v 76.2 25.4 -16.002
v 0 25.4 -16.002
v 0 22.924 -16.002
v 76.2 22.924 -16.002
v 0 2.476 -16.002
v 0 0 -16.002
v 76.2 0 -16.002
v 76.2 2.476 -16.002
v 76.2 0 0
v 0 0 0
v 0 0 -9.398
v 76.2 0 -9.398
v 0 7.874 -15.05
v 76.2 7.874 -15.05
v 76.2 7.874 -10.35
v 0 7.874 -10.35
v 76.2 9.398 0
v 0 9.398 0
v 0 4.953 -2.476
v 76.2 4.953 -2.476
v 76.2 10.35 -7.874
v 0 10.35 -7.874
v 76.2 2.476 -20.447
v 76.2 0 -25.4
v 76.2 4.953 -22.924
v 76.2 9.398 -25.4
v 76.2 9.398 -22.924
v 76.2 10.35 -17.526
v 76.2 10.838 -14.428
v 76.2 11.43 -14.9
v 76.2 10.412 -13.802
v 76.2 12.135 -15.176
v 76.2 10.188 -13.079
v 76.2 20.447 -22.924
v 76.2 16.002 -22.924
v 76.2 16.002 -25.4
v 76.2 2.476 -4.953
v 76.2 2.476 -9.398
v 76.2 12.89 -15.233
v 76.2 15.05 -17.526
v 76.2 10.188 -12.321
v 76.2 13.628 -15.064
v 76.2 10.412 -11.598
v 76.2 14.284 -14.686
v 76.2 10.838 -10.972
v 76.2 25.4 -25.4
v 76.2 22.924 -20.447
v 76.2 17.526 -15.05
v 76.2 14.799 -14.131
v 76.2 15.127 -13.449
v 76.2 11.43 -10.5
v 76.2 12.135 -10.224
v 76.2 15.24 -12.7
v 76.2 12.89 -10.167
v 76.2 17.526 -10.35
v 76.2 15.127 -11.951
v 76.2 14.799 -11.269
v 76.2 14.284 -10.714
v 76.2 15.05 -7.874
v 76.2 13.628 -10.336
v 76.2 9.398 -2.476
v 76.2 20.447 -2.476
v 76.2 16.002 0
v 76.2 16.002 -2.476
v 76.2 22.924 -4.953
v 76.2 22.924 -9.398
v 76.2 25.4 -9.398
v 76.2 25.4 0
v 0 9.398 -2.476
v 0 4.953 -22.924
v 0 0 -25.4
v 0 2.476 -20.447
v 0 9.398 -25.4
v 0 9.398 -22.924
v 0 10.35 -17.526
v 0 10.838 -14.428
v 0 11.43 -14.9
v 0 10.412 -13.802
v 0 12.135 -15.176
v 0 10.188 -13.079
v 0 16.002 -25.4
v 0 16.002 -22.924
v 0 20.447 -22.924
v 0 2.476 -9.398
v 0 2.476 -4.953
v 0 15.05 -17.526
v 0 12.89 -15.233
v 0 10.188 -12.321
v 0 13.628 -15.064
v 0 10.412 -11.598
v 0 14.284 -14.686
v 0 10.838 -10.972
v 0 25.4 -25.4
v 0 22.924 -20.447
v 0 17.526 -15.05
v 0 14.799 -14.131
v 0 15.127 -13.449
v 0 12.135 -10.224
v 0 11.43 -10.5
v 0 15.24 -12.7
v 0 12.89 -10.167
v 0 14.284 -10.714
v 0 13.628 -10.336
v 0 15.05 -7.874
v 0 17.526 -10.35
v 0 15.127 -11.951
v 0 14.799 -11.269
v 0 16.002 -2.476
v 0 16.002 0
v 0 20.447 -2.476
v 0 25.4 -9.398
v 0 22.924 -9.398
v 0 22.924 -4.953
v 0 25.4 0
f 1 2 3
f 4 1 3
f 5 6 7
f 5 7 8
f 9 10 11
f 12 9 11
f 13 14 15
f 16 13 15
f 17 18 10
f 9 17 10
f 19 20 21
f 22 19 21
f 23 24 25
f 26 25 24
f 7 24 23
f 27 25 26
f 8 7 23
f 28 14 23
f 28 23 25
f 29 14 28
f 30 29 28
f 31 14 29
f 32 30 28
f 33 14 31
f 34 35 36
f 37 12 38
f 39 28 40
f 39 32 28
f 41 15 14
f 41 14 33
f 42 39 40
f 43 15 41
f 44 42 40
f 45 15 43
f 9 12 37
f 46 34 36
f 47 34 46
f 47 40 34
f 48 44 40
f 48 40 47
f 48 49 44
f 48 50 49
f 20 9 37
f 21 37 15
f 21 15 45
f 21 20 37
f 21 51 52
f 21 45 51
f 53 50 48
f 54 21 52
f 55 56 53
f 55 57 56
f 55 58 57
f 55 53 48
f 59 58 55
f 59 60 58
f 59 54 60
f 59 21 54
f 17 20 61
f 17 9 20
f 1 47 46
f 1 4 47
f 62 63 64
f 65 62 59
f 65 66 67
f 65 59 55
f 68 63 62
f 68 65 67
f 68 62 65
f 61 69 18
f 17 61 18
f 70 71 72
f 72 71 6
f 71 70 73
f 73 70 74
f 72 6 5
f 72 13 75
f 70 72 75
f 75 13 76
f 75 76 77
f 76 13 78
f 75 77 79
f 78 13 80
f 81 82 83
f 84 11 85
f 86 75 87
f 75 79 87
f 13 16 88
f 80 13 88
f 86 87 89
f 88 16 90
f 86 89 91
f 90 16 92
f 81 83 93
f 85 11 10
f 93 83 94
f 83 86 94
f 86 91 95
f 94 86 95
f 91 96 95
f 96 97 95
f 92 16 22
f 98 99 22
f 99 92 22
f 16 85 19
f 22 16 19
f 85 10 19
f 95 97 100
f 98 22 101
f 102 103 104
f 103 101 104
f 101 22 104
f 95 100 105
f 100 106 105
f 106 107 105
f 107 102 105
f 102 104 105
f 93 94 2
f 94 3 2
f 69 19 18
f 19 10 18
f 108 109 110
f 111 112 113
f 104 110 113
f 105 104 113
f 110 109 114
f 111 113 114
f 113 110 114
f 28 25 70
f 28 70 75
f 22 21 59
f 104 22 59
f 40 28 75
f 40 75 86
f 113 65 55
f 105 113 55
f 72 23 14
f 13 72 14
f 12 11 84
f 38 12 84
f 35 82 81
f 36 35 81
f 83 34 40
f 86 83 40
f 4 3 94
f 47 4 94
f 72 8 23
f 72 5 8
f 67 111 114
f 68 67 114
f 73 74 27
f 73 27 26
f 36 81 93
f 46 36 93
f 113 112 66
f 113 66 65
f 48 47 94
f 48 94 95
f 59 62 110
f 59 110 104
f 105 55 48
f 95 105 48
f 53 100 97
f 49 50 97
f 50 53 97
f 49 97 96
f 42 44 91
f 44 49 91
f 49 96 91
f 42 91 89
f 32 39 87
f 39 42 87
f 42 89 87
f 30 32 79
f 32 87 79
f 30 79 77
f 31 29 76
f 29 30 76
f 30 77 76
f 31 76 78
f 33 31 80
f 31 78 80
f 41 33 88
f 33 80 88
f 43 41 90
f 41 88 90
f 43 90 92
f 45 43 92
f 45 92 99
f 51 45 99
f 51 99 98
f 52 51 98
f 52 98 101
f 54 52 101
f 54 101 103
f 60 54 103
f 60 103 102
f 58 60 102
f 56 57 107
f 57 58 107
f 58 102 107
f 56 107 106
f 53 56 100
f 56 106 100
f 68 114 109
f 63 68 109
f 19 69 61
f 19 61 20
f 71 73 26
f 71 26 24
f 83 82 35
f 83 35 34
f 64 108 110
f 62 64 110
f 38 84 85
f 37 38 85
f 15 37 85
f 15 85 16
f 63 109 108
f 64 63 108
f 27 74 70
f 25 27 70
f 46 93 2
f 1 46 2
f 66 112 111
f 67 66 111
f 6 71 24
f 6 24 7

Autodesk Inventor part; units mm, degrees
ref_plane "YZ Plane" through (0, 0, 0) normal (1, 0, 0) x (0, 1, 0)
ref_plane "XZ Plane" through (0, 0, 0) normal (0, 1, 0) x (-1, 0, 0)
ref_plane "XY Plane" through (0, 0, 0) normal (0, 0, 1) x (1, 0, 0)
sketch "Sketch1" plane through (0, 0, 0) normal (1, 0, 0) x (0, 1, 0)
  line L0 (0, 0) -> (0, -9.398)
  line L1 (0, -9.398) -> (2.4765, -9.398)
  line L2 (9.398, -2.4765) -> (9.398, 0)
  line L3 (9.398, 0) -> (0, 0)
  line L4 (16.002, 0) -> (16.002, -2.4765)
  line L5 (22.9235, -9.398) -> (25.4, -9.398)
  line L6 (25.4, -9.398) -> (25.4, 0)
  line L7 (25.4, 0) -> (16.002, 0)
  line L8 (25.4, -16.002) -> (22.9235, -16.002)
  line L9 (16.002, -22.9235) -> (16.002, -25.4)
  line L10 (16.002, -25.4) -> (25.4, -25.4)
  line L11 (25.4, -25.4) -> (25.4, -16.002)
  line L12 (0, -16.002) -> (2.4765, -16.002)
  line L13 (9.398, -22.9235) -> (9.398, -25.4)
  line L14 (9.398, -25.4) -> (0, -25.4)
  line L15 (0, -25.4) -> (0, -16.002)
  line L16 (22.9235, -9.398) -> (22.9235, -4.953)
  line L17 (16.002, -2.4765) -> (20.447, -2.4765)
  line L18 (20.447, -2.4765) -> (15.0495, -7.874)
  line L19 (20.447, -2.4765) -> (28.0802, -2.4765) construction
  line L20 (22.9235, -4.953) -> (17.526, -10.3505)
  line L21 (22.9235, -16.002) -> (22.9235, -20.447)
  line L22 (22.9235, -20.447) -> (17.526, -15.0495)
  line L23 (16.002, -22.9235) -> (20.447, -22.9235)
  line L24 (20.447, -22.9235) -> (15.0495, -17.526)
  line L25 (2.4765, -16.002) -> (2.4765, -20.447)
  line L26 (2.4765, -20.447) -> (7.874, -15.0495)
  line L27 (9.398, -22.9235) -> (4.953, -22.9235)
  line L28 (4.953, -22.9235) -> (10.3505, -17.526)
  line L29 (9.398, -2.4765) -> (4.953, -2.4765)
  line L30 (4.953, -2.4765) -> (10.3505, -7.874)
  line L31 (2.4765, -9.398) -> (2.4765, -4.953)
  line L32 (2.4765, -4.953) -> (7.874, -10.3505)
  line L33 (10.3505, -7.874) -> (15.0495, -7.874)
  line L34 (17.526, -10.3505) -> (17.526, -15.0495)
  line L35 (10.3505, -17.526) -> (15.0495, -17.526)
  line L36 (7.874, -15.0495) -> (7.874, -10.3505)
  circle A0 centre (12.7, -12.7) radius 2.54
  dimension "d2" = 9.398
  dimension "d3" = 2.4765
  dimension "d7" = 2.4765
  dimension "d10" = 2.4765
  dimension "d11" = 25.4
  dimension "d13" = 2.4765
  dimension "d16" = 2.4765
  dimension "d17" = 9.398
  dimension "d18" = 25.4
  dimension "d23" = 2.4765
  dimension "d24" = 25.4
  dimension "d25" = 25.4
  dimension "d32" = 4.445
  dimension "d33" = 4.445
  dimension "d35" = 135
  dimension "d36" = 4.445
  dimension "d37" = 4.445
  dimension "d38" = 2.4765
  dimension "d40" = 4.445
  dimension "d41" = 4.445
  dimension "d42" = 4.445
  dimension "d43" = 4.445
  dimension "d44" = 5.08
extrude "Extrusion1" add sketch "Sketch1" along normal blind 76.2
properties part number "LatX24in1"
